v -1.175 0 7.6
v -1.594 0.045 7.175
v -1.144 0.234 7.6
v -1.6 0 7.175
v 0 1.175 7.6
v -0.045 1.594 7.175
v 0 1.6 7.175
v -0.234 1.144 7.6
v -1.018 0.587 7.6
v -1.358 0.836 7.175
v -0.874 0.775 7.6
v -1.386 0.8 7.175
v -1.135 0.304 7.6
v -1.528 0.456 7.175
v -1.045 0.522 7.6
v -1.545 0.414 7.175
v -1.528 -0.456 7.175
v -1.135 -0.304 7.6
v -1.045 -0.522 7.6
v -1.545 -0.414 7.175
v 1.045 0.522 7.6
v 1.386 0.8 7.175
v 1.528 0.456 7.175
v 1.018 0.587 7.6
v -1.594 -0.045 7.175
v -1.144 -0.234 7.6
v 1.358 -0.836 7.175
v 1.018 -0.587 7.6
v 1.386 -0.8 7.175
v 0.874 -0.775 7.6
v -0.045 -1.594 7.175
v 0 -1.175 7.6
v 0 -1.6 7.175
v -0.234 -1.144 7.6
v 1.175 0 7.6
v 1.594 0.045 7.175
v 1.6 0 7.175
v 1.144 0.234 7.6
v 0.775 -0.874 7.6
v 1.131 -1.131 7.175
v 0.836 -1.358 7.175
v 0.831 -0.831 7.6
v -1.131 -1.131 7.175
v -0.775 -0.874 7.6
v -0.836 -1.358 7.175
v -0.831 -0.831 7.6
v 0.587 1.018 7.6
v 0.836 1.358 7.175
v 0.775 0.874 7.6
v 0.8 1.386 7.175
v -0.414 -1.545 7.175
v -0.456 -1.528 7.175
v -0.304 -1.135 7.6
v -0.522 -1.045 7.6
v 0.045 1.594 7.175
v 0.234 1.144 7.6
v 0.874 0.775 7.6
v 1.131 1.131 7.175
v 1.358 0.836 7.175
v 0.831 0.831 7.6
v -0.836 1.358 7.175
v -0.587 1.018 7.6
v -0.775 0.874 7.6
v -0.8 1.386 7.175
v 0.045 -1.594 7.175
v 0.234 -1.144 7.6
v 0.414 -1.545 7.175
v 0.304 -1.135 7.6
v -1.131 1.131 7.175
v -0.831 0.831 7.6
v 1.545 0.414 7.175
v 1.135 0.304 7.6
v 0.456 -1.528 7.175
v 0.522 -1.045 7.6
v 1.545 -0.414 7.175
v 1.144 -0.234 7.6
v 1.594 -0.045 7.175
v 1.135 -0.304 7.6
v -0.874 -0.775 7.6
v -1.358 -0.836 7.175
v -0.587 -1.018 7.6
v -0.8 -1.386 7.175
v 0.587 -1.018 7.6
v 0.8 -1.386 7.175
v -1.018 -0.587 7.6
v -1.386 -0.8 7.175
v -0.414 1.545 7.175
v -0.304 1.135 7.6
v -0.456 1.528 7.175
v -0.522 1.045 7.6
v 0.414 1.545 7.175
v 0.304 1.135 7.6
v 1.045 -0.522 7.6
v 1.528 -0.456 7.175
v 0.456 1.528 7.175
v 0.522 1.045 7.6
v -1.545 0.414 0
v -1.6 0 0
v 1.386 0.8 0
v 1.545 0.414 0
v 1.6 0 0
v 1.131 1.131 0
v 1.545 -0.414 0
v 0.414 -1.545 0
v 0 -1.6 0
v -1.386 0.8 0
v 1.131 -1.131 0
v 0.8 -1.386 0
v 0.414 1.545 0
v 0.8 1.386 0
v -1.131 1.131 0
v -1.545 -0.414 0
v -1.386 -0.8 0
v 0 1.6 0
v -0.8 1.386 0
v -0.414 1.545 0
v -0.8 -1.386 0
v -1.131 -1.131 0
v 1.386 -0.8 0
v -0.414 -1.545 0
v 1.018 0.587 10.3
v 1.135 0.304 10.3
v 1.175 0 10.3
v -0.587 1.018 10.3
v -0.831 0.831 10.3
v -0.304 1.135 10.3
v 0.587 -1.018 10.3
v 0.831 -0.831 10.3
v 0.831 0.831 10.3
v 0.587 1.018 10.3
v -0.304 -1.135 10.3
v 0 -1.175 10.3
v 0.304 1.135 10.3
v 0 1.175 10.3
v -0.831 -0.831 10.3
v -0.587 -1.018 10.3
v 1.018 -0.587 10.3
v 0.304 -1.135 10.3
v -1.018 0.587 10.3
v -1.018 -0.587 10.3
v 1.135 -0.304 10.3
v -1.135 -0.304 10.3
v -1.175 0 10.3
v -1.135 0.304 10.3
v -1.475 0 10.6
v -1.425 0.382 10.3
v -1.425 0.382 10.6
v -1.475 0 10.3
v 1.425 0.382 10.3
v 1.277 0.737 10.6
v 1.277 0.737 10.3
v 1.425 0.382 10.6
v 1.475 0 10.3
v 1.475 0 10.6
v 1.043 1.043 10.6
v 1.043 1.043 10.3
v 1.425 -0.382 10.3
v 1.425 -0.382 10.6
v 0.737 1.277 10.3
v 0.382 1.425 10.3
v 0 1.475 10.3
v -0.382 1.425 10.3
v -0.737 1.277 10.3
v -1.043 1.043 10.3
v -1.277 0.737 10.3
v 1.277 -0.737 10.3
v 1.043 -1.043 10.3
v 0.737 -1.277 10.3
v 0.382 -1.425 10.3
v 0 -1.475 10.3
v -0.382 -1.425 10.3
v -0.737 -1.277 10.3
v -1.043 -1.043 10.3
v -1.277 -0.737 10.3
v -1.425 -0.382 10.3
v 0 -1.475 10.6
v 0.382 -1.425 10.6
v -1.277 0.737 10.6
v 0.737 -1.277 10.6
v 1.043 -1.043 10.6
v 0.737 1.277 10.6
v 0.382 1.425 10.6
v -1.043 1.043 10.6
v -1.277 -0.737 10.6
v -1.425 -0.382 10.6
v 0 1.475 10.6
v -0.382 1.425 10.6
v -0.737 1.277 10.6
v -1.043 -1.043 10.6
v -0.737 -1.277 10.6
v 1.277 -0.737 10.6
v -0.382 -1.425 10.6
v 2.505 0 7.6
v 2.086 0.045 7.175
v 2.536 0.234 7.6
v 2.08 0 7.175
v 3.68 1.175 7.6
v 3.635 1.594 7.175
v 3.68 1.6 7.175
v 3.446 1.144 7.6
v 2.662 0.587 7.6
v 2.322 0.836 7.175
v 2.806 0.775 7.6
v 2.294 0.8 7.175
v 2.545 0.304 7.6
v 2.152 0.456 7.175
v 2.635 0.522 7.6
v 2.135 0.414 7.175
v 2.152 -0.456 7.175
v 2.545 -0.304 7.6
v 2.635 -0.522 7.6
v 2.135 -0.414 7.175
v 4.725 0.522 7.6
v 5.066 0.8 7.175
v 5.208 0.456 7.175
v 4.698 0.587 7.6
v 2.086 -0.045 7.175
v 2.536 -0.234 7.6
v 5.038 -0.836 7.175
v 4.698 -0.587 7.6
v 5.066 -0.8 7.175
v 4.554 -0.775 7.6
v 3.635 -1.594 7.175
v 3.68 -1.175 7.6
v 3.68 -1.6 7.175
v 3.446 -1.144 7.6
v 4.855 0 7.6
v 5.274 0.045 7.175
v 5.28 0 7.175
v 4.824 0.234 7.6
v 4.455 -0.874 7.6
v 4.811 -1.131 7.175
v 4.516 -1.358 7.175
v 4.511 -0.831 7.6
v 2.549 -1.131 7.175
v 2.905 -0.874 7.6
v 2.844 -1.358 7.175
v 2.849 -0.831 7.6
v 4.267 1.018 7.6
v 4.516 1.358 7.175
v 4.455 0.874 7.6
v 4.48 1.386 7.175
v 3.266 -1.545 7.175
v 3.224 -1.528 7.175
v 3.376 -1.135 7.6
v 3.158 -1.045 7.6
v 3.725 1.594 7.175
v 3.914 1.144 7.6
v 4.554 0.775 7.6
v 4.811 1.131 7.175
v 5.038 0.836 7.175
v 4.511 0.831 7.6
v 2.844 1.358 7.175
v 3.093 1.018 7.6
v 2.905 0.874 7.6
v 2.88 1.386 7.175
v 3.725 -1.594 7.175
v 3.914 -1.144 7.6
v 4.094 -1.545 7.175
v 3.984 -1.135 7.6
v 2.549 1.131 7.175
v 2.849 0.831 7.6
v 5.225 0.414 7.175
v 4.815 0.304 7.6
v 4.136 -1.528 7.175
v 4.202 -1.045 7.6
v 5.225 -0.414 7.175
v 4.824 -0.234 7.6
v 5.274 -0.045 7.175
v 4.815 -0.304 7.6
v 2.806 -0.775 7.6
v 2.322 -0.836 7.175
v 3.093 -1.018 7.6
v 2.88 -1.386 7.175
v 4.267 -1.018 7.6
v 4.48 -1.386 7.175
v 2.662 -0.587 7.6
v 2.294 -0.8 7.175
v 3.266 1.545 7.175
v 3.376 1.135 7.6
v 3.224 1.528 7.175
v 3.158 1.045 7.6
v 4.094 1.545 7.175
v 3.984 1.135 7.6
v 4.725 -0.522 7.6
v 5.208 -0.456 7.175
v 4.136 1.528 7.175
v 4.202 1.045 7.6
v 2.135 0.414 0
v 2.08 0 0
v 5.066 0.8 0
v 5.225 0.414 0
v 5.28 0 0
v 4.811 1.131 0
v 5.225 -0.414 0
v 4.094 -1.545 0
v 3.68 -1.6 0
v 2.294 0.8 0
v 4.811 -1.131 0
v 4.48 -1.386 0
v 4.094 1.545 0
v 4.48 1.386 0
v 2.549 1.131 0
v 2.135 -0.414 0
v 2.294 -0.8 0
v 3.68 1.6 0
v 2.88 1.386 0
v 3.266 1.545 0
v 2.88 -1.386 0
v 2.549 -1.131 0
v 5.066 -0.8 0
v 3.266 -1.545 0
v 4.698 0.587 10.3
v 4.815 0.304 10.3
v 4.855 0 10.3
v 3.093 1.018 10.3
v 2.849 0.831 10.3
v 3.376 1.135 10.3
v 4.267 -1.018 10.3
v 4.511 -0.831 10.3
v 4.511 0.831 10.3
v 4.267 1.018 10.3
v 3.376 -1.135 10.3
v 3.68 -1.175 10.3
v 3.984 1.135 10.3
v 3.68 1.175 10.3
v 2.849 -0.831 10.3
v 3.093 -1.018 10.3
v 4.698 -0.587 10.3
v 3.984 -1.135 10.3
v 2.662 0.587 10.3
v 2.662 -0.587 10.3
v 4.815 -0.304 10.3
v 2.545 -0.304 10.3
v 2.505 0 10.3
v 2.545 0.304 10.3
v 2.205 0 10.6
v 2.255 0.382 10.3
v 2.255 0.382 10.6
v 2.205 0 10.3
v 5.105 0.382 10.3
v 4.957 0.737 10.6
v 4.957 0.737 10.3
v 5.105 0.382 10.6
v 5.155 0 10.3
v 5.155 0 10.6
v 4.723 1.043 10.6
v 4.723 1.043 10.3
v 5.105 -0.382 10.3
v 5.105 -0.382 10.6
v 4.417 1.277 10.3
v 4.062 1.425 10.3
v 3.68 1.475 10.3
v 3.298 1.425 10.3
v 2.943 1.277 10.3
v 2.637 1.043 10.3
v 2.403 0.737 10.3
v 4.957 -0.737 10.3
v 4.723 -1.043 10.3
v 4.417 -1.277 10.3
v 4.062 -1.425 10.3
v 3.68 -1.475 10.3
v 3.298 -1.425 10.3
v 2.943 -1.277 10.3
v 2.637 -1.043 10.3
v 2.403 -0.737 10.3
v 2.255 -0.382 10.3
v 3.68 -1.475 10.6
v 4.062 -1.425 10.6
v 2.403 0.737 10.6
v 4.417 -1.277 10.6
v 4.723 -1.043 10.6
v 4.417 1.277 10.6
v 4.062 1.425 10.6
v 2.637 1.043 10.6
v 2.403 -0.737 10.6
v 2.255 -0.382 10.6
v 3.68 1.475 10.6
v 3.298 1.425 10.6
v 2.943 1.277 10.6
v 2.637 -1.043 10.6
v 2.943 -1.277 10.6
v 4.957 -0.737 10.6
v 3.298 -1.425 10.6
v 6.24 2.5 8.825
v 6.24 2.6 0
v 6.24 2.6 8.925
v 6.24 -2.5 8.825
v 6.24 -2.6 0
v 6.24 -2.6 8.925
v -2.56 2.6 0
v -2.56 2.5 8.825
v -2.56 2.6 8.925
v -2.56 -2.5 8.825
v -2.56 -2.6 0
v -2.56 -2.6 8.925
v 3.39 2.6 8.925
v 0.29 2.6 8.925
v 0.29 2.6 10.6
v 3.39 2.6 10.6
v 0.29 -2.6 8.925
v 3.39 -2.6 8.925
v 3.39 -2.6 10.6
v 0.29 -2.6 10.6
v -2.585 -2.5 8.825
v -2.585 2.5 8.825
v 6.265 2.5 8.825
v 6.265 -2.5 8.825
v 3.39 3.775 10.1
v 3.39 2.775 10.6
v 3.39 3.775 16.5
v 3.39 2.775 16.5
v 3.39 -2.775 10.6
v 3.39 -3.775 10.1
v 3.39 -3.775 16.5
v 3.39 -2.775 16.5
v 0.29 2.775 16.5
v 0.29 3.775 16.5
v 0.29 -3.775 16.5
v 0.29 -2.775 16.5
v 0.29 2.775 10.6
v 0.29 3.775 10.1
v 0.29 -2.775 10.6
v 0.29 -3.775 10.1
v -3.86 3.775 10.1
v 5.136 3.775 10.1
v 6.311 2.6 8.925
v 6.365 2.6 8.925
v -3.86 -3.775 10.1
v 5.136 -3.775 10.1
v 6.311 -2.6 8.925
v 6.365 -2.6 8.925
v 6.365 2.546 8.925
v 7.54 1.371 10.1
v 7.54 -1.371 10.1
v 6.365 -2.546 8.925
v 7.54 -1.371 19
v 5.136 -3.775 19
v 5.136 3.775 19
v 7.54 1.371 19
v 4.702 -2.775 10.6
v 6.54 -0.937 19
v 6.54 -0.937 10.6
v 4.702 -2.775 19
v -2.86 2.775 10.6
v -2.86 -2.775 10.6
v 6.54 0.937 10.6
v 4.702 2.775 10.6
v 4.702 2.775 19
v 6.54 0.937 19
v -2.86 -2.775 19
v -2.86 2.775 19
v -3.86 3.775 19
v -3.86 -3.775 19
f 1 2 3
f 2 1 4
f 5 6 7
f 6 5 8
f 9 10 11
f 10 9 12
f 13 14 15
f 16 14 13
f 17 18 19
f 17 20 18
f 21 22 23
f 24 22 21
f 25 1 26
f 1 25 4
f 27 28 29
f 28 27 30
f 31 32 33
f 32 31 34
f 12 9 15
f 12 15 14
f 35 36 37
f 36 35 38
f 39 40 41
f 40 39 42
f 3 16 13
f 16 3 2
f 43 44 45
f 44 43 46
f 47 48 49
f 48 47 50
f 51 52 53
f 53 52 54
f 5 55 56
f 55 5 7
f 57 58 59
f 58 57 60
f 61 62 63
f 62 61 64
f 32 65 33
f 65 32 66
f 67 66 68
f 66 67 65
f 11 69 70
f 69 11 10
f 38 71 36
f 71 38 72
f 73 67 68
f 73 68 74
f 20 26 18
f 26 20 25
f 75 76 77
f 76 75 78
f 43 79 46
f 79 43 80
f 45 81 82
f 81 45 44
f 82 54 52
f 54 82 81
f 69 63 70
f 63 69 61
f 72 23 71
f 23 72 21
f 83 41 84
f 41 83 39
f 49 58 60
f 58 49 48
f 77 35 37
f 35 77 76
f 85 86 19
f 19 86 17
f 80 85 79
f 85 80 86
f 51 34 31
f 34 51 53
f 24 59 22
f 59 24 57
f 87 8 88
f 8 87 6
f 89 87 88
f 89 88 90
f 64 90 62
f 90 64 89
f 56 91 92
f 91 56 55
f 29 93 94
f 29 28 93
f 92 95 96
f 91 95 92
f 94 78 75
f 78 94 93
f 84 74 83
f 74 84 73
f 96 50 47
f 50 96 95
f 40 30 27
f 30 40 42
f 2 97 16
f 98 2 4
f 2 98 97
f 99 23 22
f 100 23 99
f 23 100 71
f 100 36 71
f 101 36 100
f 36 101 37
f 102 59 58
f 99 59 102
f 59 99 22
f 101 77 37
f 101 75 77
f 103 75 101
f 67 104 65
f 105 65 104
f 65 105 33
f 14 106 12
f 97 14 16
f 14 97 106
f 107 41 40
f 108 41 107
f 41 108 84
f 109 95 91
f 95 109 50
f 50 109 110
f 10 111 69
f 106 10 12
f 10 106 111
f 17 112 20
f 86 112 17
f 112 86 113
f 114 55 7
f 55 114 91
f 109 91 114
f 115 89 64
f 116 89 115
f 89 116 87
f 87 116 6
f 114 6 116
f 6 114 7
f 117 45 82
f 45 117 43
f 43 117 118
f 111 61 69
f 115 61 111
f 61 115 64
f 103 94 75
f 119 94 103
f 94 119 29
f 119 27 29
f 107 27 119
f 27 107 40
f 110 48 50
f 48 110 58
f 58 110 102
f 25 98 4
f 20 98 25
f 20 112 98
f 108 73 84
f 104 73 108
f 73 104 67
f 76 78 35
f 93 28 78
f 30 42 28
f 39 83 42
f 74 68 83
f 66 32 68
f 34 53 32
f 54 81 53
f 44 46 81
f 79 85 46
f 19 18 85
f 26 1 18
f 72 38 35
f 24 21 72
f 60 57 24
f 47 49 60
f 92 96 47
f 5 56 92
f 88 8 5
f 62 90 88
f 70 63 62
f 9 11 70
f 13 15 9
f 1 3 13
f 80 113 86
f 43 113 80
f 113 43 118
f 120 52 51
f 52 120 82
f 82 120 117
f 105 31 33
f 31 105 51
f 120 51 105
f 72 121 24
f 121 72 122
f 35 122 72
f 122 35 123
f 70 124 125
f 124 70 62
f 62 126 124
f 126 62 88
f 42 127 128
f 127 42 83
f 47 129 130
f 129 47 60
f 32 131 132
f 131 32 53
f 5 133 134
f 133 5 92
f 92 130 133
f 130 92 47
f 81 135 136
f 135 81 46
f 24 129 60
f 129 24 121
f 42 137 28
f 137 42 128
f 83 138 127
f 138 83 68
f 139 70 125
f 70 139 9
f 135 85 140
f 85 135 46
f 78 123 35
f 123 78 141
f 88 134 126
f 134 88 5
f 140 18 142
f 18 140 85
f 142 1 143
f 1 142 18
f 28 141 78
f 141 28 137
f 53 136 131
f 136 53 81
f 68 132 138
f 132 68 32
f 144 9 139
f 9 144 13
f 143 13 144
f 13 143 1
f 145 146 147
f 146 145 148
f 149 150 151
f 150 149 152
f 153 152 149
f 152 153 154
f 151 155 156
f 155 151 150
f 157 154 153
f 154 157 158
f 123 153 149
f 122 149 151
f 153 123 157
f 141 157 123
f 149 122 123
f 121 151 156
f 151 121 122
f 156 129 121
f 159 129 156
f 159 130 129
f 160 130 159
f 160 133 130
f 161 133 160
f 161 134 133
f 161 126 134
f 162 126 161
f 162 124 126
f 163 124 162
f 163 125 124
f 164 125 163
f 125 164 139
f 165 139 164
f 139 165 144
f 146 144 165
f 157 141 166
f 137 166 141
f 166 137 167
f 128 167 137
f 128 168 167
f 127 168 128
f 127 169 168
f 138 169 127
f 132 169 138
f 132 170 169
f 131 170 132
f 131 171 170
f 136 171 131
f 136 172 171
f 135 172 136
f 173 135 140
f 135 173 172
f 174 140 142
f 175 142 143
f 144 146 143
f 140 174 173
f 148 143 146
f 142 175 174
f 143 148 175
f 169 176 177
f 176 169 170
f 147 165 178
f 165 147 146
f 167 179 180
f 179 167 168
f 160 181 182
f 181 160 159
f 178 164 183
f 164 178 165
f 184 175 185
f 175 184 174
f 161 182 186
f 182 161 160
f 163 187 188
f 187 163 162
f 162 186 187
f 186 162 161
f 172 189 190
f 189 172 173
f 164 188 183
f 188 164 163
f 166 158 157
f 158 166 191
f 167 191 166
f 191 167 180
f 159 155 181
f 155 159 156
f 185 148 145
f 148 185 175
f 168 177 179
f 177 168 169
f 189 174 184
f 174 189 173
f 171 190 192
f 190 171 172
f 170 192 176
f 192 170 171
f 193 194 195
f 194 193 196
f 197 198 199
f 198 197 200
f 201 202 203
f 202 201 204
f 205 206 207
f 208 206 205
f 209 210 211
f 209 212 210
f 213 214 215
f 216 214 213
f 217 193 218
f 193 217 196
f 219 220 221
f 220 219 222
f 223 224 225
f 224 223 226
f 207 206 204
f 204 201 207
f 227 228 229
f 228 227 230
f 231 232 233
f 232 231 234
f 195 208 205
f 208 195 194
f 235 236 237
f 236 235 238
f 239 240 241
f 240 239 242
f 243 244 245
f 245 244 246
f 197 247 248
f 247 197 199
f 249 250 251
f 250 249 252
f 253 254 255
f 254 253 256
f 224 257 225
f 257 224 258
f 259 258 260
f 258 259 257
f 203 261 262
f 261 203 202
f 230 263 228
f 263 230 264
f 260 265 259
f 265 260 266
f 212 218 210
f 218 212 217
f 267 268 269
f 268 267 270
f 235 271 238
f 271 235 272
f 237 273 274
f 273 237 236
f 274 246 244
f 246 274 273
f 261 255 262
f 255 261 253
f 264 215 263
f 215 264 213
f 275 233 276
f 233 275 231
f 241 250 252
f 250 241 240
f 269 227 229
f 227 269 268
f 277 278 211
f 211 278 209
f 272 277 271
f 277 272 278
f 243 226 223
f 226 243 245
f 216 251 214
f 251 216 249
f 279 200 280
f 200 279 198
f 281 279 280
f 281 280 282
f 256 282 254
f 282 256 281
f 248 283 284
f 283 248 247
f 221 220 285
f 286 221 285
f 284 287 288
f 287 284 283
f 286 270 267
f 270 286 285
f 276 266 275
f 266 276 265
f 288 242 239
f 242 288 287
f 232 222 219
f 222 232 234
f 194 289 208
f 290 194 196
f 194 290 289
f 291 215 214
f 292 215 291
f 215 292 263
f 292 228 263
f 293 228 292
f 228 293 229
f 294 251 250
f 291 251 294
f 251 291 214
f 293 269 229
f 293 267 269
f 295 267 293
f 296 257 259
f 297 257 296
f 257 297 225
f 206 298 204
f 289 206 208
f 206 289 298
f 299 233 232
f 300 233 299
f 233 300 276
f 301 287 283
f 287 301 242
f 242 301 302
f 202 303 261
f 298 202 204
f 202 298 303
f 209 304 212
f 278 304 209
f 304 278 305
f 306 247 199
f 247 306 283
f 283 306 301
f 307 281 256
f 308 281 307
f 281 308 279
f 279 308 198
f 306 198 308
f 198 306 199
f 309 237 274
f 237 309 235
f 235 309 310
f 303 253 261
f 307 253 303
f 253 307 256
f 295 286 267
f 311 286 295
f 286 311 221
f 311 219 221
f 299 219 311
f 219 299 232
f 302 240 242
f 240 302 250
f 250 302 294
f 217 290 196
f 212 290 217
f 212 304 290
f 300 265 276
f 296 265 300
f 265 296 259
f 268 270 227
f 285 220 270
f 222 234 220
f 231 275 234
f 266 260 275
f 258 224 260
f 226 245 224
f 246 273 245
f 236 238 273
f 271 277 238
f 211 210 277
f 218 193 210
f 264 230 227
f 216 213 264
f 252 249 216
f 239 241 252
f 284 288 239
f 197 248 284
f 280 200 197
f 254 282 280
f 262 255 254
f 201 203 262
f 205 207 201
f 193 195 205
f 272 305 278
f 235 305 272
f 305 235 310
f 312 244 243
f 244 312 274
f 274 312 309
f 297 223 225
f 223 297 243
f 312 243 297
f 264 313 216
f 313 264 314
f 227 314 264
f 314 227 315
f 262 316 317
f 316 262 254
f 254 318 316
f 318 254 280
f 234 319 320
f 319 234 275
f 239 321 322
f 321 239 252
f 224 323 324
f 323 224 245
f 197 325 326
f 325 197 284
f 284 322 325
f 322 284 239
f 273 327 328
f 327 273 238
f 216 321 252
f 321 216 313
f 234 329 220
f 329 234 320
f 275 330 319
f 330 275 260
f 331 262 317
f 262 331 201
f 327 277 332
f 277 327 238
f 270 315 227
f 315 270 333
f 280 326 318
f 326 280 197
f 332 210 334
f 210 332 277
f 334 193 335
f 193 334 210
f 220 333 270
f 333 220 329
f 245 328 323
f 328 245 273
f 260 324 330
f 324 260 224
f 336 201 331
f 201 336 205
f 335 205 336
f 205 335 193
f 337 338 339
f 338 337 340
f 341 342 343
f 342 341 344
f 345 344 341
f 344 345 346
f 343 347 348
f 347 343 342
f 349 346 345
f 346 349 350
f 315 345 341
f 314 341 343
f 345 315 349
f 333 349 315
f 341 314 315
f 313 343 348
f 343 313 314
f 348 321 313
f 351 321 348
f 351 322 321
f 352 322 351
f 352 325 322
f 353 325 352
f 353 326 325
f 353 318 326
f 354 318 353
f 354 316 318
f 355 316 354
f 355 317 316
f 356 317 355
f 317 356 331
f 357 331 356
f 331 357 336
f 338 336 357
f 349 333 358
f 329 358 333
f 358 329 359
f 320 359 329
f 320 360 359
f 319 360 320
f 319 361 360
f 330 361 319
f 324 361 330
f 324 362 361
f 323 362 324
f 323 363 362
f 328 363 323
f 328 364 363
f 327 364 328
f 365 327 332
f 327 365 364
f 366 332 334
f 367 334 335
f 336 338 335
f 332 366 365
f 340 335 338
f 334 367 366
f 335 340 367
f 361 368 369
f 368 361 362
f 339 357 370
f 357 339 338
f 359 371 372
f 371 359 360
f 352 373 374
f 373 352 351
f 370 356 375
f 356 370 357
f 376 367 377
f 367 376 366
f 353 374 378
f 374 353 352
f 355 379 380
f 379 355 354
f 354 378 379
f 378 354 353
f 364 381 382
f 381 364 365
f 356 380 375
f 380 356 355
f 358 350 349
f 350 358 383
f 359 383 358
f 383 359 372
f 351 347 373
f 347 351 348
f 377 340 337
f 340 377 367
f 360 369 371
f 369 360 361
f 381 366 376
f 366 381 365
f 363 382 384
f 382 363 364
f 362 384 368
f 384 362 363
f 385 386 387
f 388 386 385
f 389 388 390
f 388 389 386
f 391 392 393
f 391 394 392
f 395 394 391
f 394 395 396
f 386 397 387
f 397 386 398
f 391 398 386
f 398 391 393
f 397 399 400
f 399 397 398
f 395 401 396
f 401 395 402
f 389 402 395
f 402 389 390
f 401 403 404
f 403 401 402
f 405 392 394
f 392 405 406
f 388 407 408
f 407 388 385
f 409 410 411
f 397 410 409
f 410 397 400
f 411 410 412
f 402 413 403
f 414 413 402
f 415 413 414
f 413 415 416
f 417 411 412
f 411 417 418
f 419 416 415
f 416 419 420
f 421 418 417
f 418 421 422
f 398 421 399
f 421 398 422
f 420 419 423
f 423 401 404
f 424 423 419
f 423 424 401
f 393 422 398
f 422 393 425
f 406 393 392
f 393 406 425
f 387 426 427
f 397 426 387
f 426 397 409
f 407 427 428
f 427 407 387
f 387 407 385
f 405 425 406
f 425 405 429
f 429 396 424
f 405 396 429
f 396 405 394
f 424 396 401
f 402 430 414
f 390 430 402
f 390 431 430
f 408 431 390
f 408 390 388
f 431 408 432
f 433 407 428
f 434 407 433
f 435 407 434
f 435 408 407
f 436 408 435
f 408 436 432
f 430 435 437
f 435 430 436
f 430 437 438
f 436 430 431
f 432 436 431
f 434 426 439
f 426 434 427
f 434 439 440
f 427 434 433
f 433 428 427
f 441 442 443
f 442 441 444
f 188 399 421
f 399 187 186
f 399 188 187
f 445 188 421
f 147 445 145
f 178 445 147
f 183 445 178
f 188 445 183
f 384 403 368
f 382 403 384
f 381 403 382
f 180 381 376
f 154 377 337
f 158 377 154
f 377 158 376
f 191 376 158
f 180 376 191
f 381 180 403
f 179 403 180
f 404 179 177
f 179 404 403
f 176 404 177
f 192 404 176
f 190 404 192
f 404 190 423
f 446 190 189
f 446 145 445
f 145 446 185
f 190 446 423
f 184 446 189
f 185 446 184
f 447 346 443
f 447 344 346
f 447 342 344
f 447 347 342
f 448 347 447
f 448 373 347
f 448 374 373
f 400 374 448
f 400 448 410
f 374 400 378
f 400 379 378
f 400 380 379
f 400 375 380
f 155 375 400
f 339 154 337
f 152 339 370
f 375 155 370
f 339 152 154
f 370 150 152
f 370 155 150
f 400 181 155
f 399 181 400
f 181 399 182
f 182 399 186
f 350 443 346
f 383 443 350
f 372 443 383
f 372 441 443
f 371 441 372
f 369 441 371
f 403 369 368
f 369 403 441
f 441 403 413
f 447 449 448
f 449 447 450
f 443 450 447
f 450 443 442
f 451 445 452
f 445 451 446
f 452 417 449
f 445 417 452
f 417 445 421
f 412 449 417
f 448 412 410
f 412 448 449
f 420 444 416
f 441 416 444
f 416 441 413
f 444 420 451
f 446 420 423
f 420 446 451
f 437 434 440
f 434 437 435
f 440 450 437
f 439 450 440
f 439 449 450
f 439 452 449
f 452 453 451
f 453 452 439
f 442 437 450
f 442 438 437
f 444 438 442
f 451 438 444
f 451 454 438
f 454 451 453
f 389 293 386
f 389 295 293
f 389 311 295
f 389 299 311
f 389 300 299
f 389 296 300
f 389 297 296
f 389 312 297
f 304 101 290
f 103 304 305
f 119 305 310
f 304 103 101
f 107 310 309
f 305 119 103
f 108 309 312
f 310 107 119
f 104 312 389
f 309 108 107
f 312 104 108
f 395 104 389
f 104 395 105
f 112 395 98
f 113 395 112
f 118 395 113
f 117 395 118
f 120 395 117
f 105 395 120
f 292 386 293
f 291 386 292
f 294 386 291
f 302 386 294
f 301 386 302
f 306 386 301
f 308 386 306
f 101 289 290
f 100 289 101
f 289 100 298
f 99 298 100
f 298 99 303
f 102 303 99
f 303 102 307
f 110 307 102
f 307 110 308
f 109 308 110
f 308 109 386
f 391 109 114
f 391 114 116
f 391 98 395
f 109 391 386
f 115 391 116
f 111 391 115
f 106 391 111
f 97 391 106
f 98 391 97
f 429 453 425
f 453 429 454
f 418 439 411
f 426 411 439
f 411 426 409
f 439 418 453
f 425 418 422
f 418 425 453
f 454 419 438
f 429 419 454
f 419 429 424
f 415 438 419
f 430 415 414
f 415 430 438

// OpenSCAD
// F. Davies  2018
//
// connectors that can use contacts for Molex 062 connectors
//
//  These are designed to use the following contacts:
//  female contact Molex P/N 02-06-1103
//  male contact   Molex P/N 02-06-2103
//
//  These are similar to and designed to mate with the following:
//  3 position plug Crimp Housing        Molex P/N 03-06-2031
//  3 position Receptacle Crimp Housing  Molex P/N 03-06-1032
//  4 position plug Crimp Housing        Molex P/N 03-06-2041
//  4 position Receptacle Crimp Housing  Molex P/N 03-06-1042
//  6 position plug Crimp Housing        Molex P/N 03-06-2061  
//  6 position Receptacle Crimp Housing  Molex P/N 03-06-1062
//
// For best results, print the hole size test block first and
//  see which hole setting works best with your printer


holeAdj = 2;  // set this to best value determined with holeTester (hole_test_block.stl)

$fn=24;
delta=0.1;  // for making surfaces non-coincident

//holeTester();

//  uncomment the connector that you want 
//recep2();
// recep6();
// recep4();
// recep3();

plug2();
//plug3();
// plug4();
// plug6();


module holeTester()
{
    union()
    {
        difference()
        {
            translate([-6,0,0]) cube([5+6,30,11-5],center=false);
            translate([-11,-1,0.5]) cube([11,32,6],center=false);
            for (i=[0,1,2,3,4,5])
                translate([2.5,3+i*4.5,-5]) plugHoleCutter(0.1*i);
        }  
        translate([-1,1,0.2])
            scale([0.4,0.4,1]) rotate([0,0,90])
                linear_extrude(height = 0.5) {
                    text("0 1 2 3 4 5", font = "Liberation Sans:style=Bold"); }
    }
};

i2mm = 25.4; // for converting inches to millimeters.

p = 3.68;  //hole pitch, distance between centers of holes


/*
translate([0,60,0]) recep6();
translate([0,40,0]) recep4();
translate([0,20,0]) recep3();

translate([40,20,0]) plug3();
translate([40,40,0]) plug4();
translate([40,60,0]) plug6();
*/

module recep6()
{
    recep(3,2,19.8,12.6,8.8,8.4,1,5,0.6,4,2.3,2,1,1.5,2.4);
}

module recep3()
{
    recep(1,3,19.8,4.9,12.3,9.1,1.8,5.5,0.6,3.5,2.3,2,1,2.2,0);
}

module recep4()
{
    recep(1,4,19.8,4.9,16.0,9.1,1.8,5.5,0.6,3.5,2.3,2,1,2.2,0);
}
module recep2()
{
    recep(1,2,19.8,4.9,8.8,9.1,1.8,5.5,0.6,3.5,2.3,2,1,2.2,0);
}

module recep(n,m,d,e,f,g,th1,th2,ta,tf,tw,rw,ra,cw,kw)
{
    /*
    d = 19.8;  // height of receptacle (front face to back face)
    e = 12.6;  // Width of face of receptacle (along axis through tabs, y axis)
    f = 8.8;  // Length of face of receptacle (x axis)
    g = 8.4;  // distance from front face to plane of front-to-back transition
    th1 = 1;  // z direction thickness of flat part of tab
    th2 = 5;  // z axis thickness of tab where it intersects body
    ta = 0.6;  // distance tab sticks out from body of receptacle
    tf = 4; // z axis distance from face plane to mid point of tab
    tw = 2.3;  // width of tab in x axis direction
    rw = 2; // x axis width of rib
    ra = 1; // distance rib sticks out from body of receptacle
    cw = 1.5; // width of face of corner cuts (measured on diagonal)
    kw = 2.4; // width of triangule key slot, measured in y direction
    */

    clx = p*(m-1)/2; // x coordinate of centerline parallel to y axis
    cly = p*(n-1)/2; // y coordinate of centerline parallel to x axis
    
    difference()
    {
        union() // main part of body
        {
            translate([clx,cly,d/2-delta/2])
                cube([f,e,d+delta],center=true);
            // tabs
            translate([clx,cly,d-tf])
                hull()
                {
                    cube([tw,2*ta+e,th1],center=true);
                    cube([tw,e-delta,th2+ta*delta/(th2-th1)],center=true);
                } // hull
            // ribs
            for (i=[-1,1])
                translate([clx+i*f/4,cly-e/2,(d-g)/2-2*delta])
                    cube([rw,2*ra,d-g+2*delta],center=true);
        } // union
        // holes for contacts
        for (i=[1:n])
            for (j=[1:m])
                translate([(j-1)*p,(i-1)*p,0]) recepHoleCutter(0.1*holeAdj);
        
        // corner trim
        for (i=[-1,1])
            translate([clx+f/2+delta,cly+i*(e/2+delta),delta/2-g/2+d])
                rotate([0,0,45])
                    cube([cw+2*1.414*delta,cw+2*1.414*delta,g+delta],center=true);
        
        // key ways
        for (i=[1:n-1])
            translate([clx-f/2-delta,p/2+p*(i-1),(g+delta)/2+d-g])
                rotate([0,0,45])
                    cube([0.707*(kw+2*delta),0.707*(kw+2*delta),g+delta],center=true);
       
        // bottom trim
        translate([clx,cly,-10*delta/2])
            cube([2*f,2*e,10*delta],center=true);
    } // difference


}




/*  cross sections for checking clearances*/ 
/*
//projection(cut = true)   
//rotate([90,0,0]) 
union() { 
    //recep();  
    translate([0,(n-1)*p,31]) rotate([180,0,0]) plug();
    
    translate([30,-p/2,0]) rotate([0,0,90]) 
    union(){ recep();  translate([0,(n-1)*p,31]) rotate([180,0,0]) plug(); }
        
            translate([60,0,0]) rotate([0,0,90]) 
    union(){ recep();  translate([0,(n-1)*p,31]) rotate([180,0,0]) plug();}
        
    } 
*/

module recepHoleCutter(extra)
{
    backSegmentLength = 7.7;
    backSegmentDiam = 3.2;  // back
    middleSegmentLength = 2.7;
    middleSegmentDiam = 2.15+extra;
    frontSegmentLength = 9.4;
    FrontSegmentDiam = 2.75+extra;
union()
    {
        // bottom part
        difference()
        {
            translate([0,0,-delta])
                cylinder(d=backSegmentDiam,h=backSegmentLength+delta,center=false);
            translate([0,0,backSegmentLength]) rotate([0,180,0])
                outerCircularBevelCutter(backSegmentDiam,(backSegmentDiam-middleSegmentDiam)/2);
        } 
        translate([0,0,backSegmentLength-delta])
            cylinder(d=middleSegmentDiam,h=middleSegmentLength+2*delta,center=false); 
        translate([0,0,backSegmentLength+middleSegmentLength])
            cylinder(d=FrontSegmentDiam,h=frontSegmentLength+delta*4,center=false);

    }
}

module plugHoleCutter(extra)
{
    backSegmentLength = (10.8-3.2);
    backSegmentDiam = 3.2;  // back
    middleSegmentLength = 2.7;
    middleSegmentDiam = 2.15+extra;
    frontSegmentLength = 0.5;
    FrontSegmentDiam = 2.75+extra;
union()
    {
        // botton part
        difference()
        {
            translate([0,0,-delta])
                cylinder(d=backSegmentDiam,h=backSegmentLength+delta,center=false);
            translate([0,0,backSegmentLength]) rotate([0,180,0])
                outerCircularBevelCutter(backSegmentDiam,(backSegmentDiam-middleSegmentDiam)/2);
        } 
        translate([0,0,backSegmentLength-delta])
            cylinder(d=middleSegmentDiam,h=middleSegmentLength+2*delta,center=false); 
        translate([0,0,backSegmentLength+middleSegmentLength])
            cylinder(d=FrontSegmentDiam,h=frontSegmentLength+delta*4,center=false);

    }    
}

module plug2()
{
    genPlug(1,2,19.0,7.55,11.4,8.4,3.1,2.5,0,0,2.6,3.4,0,5.2,8.8,0.5,1.0); 
}
module plug3()
{
    genPlug(1,3,19.0,7.55,15.0,8.4,3.1,2.5,0,0,2.6,3.4,0,5.2,12.4,0.5,1.0); 
}

module plug6()
{
    genPlug(3,2,19.2,15.1,11.4,8.4,3.1,2.6,0,0,1.5,1.5,2.4,12.6,8.8,0.5,1.0);
}

module plug4()
{
    genPlug(1,4,18.5,7.55,18.7,7.8,3.1,2.1,2,1,2.6,3.4,0,5.2,16.1,0.5,1.0); 
}

module genPlug(n,m,d,e,f,g,tsw,tsb,rw,ra,cw1,cw2,kw,er,fr,ge,w)
{
 /*   d = 19.2;  // height of receptacle (front face to back face)
    e = 15.1;  // Width of face of receptacle (along axis through tabs, y axis)
    f = 11.4;  // Length of face of receptacle (x axis)
    g = 10;  //  distance from front face to plane of front-to-back transition

    tsw = 3.1;  // width of slot for tab
    tsb = 2.6;  // bridge over slot for tab
    rw = 2; // x axis width of rib
    ra = 1; // distance rib sticks out from body of receptacle
    
    cw1 = 1.5; // width of face of corner cuts (measured on diagonal)
    cw2 = 1.5;  // cuts on outside
    kw = 2.4; // width of triangule key slot, measured in y direction    
    
    er = 12.6;  // Width of face of receptacle (along axis through tabs, y axis)
    fr = 8.8;  // Length of face of receptacle (x axis)
    
    ge = 0.5;  
    w = 1.0;  // thickness of walls of shroud */
    
    clx = p*(m-1)/2; // x coordinate of centerline parallel to y axis
    cly = p*(n-1)/2; // y coordinate of centerline parallel to x axis
    
    difference()
    {
        // main body
        translate([clx,cly,d/2]) cube([f,e,d],center=true);

        // holes for contacts
        for (i=[1:n])
            for (j=[1:m])
                translate([(j-1)*p,(i-1)*p,0]) plugHoleCutter(0.1*holeAdj);    
        
        // back cutter    
        difference()
        {
            difference()
            {
                translate([clx,cly,d/2])
                    cube([f+2*delta,e+2*delta,d+2*delta],center=true);
                translate([clx,cly,d/2])  // take out center of cutter
                    cube([fr,er,d+4*delta],center=true);
            }  // difference
            
            difference()
            {
                translate([clx,cly,d/2+(d-(g+ge)-(e-er)/2-delta)])
                    cube([f+4*delta,e+4*delta,d],center=true);
                translate([clx,cly,d/2-tsb])
                    cube([tsw,e+6*delta,d],center=true);  // for tab
                translate([clx,cly,d/2+(d/2-(g+ge)-(e-er)/2-delta)])
                    outerRectangleBevelCutter(f+4*delta,e+4*delta,(e-er)/2+3*delta);
            }  // difference
            
            difference()
            {
                
            }  // difference            
        } // difference  back cutter

        // trim
                for (i=[-1,1])
                    translate([clx+f/2+delta,cly+i*(e/2+delta),delta/2-g/2+d])
                        rotate([0,0,45])
                            cube([cw2+2.828*delta,cw2+2.828*delta,g+2*ge+(e-er)+delta],center=true);

        difference()  // front cutter
        {
            union()
            {
                translate([clx,cly,d/2+d-g])
                    cube([f-2*w,e-2*w,d],center=true);

            }
            for (i=[-1,1]) // make inner keying diagonal corners
                translate([clx+(f-2*w)/2+delta,cly+i*((e-2*w)/2+delta),delta/2-g/2+d])
                    rotate([0,0,45])
                        cube([cw1+2.828*delta,cw1+2.828*delta,g+delta],center=true);
            for (i=[1:n-1])
                translate([clx-(f-2*w)/2-delta,p/2+p*(i-1),-g/2+d])
                    rotate([0,0,45])
                        cube([0.707*(kw+2*delta),0.707*(kw+2*delta),g+2*delta],center=true);
            
        } // difference  front cutter
    }  // difference
};

module outerCircularBevelCutter(d,b)  // improved
{
  difference()  {
   translate([0,0,-delta/2]) cylinder(d=d+delta*2,h=b+1*delta);
   translate([0,0,-1*delta]) cylinder(d1=d-2*b-2*delta,d2=d+2*delta, h=b+2*delta);
  }
};

module outerRectangleBevelCutter(l,w,b)
{ // 
  polyhedron(
    points=[ [l/2+b,w/2+b,2*b],[l/2-2*b,w/2-2*b,-b],[l/2+b,w/2+b,-b],
             [-l/2-b,w/2+b,2*b],[-l/2+2*b,w/2-2*b,-b],[-l/2-b,w/2+b,-b],
             [-l/2-b,-w/2-b,2*b],[-l/2+2*b,-w/2+2*b,-b],[-l/2-b,-w/2-b,-b],
            [l/2+b,-w/2-b,2*b],[l/2-2*b,-w/2+2*b,-b],[l/2+b,-w/2-b,-b] ],
    faces = [  [0,3,2],  [3,5,2],  [2,5,4],   [2,4,1],  [1,4, 0], [0,4,3] 
              ,[3,6,5],  [6,8,5],  [5,8,7],   [5,7,4],  [4,7, 3], [3,7,6] 
              ,[6,9,8],  [9,11,8], [8,11,10], [8,10,7], [7,10,6], [6,10,9] 
              ,[9,0,11], [0,2,11], [11,2,1],  [11,1,10], [10,1,9], [9,1,0] ] ); 
};

module innerRectangleBevelCutter(l,w,b)
{ // 
  polyhedron(
    points=[ [l/2-b,w/2-b,2*b],[l/2-b,w/2-b,-b],[l/2+2*b,w/2+2*b,-b],
             [-l/2+b,w/2-b,2*b],[-l/2+b,w/2-b,-b],[-l/2-2*b,w/2+2*b,-b],
             [-l/2+b,-w/2+b,2*b],[-l/2+b,-w/2+b,-b],[-l/2-2*b,-w/2-2*b,-b],
            [l/2-b,-w/2+b,2*b],[l/2-b,-w/2+b,-b],[l/2+2*b,-w/2-2*b,-b] ],
    faces = [  [0,3,2],  [3,5,2],  [2,5,4],   [2,4,1],  [1,4, 0], [0,4,3] 
              ,[3,6,5],  [6,8,5],  [5,8,7],   [5,7,4],  [4,7, 3], [3,7,6] 
              ,[6,9,8],  [9,11,8], [8,11,10], [8,10,7], [7,10,6], [6,10,9] 
              ,[9,0,11], [0,2,11], [11,2,1],  [11,1,10], [10,1,9], [9,1,0] ] ); 
};
